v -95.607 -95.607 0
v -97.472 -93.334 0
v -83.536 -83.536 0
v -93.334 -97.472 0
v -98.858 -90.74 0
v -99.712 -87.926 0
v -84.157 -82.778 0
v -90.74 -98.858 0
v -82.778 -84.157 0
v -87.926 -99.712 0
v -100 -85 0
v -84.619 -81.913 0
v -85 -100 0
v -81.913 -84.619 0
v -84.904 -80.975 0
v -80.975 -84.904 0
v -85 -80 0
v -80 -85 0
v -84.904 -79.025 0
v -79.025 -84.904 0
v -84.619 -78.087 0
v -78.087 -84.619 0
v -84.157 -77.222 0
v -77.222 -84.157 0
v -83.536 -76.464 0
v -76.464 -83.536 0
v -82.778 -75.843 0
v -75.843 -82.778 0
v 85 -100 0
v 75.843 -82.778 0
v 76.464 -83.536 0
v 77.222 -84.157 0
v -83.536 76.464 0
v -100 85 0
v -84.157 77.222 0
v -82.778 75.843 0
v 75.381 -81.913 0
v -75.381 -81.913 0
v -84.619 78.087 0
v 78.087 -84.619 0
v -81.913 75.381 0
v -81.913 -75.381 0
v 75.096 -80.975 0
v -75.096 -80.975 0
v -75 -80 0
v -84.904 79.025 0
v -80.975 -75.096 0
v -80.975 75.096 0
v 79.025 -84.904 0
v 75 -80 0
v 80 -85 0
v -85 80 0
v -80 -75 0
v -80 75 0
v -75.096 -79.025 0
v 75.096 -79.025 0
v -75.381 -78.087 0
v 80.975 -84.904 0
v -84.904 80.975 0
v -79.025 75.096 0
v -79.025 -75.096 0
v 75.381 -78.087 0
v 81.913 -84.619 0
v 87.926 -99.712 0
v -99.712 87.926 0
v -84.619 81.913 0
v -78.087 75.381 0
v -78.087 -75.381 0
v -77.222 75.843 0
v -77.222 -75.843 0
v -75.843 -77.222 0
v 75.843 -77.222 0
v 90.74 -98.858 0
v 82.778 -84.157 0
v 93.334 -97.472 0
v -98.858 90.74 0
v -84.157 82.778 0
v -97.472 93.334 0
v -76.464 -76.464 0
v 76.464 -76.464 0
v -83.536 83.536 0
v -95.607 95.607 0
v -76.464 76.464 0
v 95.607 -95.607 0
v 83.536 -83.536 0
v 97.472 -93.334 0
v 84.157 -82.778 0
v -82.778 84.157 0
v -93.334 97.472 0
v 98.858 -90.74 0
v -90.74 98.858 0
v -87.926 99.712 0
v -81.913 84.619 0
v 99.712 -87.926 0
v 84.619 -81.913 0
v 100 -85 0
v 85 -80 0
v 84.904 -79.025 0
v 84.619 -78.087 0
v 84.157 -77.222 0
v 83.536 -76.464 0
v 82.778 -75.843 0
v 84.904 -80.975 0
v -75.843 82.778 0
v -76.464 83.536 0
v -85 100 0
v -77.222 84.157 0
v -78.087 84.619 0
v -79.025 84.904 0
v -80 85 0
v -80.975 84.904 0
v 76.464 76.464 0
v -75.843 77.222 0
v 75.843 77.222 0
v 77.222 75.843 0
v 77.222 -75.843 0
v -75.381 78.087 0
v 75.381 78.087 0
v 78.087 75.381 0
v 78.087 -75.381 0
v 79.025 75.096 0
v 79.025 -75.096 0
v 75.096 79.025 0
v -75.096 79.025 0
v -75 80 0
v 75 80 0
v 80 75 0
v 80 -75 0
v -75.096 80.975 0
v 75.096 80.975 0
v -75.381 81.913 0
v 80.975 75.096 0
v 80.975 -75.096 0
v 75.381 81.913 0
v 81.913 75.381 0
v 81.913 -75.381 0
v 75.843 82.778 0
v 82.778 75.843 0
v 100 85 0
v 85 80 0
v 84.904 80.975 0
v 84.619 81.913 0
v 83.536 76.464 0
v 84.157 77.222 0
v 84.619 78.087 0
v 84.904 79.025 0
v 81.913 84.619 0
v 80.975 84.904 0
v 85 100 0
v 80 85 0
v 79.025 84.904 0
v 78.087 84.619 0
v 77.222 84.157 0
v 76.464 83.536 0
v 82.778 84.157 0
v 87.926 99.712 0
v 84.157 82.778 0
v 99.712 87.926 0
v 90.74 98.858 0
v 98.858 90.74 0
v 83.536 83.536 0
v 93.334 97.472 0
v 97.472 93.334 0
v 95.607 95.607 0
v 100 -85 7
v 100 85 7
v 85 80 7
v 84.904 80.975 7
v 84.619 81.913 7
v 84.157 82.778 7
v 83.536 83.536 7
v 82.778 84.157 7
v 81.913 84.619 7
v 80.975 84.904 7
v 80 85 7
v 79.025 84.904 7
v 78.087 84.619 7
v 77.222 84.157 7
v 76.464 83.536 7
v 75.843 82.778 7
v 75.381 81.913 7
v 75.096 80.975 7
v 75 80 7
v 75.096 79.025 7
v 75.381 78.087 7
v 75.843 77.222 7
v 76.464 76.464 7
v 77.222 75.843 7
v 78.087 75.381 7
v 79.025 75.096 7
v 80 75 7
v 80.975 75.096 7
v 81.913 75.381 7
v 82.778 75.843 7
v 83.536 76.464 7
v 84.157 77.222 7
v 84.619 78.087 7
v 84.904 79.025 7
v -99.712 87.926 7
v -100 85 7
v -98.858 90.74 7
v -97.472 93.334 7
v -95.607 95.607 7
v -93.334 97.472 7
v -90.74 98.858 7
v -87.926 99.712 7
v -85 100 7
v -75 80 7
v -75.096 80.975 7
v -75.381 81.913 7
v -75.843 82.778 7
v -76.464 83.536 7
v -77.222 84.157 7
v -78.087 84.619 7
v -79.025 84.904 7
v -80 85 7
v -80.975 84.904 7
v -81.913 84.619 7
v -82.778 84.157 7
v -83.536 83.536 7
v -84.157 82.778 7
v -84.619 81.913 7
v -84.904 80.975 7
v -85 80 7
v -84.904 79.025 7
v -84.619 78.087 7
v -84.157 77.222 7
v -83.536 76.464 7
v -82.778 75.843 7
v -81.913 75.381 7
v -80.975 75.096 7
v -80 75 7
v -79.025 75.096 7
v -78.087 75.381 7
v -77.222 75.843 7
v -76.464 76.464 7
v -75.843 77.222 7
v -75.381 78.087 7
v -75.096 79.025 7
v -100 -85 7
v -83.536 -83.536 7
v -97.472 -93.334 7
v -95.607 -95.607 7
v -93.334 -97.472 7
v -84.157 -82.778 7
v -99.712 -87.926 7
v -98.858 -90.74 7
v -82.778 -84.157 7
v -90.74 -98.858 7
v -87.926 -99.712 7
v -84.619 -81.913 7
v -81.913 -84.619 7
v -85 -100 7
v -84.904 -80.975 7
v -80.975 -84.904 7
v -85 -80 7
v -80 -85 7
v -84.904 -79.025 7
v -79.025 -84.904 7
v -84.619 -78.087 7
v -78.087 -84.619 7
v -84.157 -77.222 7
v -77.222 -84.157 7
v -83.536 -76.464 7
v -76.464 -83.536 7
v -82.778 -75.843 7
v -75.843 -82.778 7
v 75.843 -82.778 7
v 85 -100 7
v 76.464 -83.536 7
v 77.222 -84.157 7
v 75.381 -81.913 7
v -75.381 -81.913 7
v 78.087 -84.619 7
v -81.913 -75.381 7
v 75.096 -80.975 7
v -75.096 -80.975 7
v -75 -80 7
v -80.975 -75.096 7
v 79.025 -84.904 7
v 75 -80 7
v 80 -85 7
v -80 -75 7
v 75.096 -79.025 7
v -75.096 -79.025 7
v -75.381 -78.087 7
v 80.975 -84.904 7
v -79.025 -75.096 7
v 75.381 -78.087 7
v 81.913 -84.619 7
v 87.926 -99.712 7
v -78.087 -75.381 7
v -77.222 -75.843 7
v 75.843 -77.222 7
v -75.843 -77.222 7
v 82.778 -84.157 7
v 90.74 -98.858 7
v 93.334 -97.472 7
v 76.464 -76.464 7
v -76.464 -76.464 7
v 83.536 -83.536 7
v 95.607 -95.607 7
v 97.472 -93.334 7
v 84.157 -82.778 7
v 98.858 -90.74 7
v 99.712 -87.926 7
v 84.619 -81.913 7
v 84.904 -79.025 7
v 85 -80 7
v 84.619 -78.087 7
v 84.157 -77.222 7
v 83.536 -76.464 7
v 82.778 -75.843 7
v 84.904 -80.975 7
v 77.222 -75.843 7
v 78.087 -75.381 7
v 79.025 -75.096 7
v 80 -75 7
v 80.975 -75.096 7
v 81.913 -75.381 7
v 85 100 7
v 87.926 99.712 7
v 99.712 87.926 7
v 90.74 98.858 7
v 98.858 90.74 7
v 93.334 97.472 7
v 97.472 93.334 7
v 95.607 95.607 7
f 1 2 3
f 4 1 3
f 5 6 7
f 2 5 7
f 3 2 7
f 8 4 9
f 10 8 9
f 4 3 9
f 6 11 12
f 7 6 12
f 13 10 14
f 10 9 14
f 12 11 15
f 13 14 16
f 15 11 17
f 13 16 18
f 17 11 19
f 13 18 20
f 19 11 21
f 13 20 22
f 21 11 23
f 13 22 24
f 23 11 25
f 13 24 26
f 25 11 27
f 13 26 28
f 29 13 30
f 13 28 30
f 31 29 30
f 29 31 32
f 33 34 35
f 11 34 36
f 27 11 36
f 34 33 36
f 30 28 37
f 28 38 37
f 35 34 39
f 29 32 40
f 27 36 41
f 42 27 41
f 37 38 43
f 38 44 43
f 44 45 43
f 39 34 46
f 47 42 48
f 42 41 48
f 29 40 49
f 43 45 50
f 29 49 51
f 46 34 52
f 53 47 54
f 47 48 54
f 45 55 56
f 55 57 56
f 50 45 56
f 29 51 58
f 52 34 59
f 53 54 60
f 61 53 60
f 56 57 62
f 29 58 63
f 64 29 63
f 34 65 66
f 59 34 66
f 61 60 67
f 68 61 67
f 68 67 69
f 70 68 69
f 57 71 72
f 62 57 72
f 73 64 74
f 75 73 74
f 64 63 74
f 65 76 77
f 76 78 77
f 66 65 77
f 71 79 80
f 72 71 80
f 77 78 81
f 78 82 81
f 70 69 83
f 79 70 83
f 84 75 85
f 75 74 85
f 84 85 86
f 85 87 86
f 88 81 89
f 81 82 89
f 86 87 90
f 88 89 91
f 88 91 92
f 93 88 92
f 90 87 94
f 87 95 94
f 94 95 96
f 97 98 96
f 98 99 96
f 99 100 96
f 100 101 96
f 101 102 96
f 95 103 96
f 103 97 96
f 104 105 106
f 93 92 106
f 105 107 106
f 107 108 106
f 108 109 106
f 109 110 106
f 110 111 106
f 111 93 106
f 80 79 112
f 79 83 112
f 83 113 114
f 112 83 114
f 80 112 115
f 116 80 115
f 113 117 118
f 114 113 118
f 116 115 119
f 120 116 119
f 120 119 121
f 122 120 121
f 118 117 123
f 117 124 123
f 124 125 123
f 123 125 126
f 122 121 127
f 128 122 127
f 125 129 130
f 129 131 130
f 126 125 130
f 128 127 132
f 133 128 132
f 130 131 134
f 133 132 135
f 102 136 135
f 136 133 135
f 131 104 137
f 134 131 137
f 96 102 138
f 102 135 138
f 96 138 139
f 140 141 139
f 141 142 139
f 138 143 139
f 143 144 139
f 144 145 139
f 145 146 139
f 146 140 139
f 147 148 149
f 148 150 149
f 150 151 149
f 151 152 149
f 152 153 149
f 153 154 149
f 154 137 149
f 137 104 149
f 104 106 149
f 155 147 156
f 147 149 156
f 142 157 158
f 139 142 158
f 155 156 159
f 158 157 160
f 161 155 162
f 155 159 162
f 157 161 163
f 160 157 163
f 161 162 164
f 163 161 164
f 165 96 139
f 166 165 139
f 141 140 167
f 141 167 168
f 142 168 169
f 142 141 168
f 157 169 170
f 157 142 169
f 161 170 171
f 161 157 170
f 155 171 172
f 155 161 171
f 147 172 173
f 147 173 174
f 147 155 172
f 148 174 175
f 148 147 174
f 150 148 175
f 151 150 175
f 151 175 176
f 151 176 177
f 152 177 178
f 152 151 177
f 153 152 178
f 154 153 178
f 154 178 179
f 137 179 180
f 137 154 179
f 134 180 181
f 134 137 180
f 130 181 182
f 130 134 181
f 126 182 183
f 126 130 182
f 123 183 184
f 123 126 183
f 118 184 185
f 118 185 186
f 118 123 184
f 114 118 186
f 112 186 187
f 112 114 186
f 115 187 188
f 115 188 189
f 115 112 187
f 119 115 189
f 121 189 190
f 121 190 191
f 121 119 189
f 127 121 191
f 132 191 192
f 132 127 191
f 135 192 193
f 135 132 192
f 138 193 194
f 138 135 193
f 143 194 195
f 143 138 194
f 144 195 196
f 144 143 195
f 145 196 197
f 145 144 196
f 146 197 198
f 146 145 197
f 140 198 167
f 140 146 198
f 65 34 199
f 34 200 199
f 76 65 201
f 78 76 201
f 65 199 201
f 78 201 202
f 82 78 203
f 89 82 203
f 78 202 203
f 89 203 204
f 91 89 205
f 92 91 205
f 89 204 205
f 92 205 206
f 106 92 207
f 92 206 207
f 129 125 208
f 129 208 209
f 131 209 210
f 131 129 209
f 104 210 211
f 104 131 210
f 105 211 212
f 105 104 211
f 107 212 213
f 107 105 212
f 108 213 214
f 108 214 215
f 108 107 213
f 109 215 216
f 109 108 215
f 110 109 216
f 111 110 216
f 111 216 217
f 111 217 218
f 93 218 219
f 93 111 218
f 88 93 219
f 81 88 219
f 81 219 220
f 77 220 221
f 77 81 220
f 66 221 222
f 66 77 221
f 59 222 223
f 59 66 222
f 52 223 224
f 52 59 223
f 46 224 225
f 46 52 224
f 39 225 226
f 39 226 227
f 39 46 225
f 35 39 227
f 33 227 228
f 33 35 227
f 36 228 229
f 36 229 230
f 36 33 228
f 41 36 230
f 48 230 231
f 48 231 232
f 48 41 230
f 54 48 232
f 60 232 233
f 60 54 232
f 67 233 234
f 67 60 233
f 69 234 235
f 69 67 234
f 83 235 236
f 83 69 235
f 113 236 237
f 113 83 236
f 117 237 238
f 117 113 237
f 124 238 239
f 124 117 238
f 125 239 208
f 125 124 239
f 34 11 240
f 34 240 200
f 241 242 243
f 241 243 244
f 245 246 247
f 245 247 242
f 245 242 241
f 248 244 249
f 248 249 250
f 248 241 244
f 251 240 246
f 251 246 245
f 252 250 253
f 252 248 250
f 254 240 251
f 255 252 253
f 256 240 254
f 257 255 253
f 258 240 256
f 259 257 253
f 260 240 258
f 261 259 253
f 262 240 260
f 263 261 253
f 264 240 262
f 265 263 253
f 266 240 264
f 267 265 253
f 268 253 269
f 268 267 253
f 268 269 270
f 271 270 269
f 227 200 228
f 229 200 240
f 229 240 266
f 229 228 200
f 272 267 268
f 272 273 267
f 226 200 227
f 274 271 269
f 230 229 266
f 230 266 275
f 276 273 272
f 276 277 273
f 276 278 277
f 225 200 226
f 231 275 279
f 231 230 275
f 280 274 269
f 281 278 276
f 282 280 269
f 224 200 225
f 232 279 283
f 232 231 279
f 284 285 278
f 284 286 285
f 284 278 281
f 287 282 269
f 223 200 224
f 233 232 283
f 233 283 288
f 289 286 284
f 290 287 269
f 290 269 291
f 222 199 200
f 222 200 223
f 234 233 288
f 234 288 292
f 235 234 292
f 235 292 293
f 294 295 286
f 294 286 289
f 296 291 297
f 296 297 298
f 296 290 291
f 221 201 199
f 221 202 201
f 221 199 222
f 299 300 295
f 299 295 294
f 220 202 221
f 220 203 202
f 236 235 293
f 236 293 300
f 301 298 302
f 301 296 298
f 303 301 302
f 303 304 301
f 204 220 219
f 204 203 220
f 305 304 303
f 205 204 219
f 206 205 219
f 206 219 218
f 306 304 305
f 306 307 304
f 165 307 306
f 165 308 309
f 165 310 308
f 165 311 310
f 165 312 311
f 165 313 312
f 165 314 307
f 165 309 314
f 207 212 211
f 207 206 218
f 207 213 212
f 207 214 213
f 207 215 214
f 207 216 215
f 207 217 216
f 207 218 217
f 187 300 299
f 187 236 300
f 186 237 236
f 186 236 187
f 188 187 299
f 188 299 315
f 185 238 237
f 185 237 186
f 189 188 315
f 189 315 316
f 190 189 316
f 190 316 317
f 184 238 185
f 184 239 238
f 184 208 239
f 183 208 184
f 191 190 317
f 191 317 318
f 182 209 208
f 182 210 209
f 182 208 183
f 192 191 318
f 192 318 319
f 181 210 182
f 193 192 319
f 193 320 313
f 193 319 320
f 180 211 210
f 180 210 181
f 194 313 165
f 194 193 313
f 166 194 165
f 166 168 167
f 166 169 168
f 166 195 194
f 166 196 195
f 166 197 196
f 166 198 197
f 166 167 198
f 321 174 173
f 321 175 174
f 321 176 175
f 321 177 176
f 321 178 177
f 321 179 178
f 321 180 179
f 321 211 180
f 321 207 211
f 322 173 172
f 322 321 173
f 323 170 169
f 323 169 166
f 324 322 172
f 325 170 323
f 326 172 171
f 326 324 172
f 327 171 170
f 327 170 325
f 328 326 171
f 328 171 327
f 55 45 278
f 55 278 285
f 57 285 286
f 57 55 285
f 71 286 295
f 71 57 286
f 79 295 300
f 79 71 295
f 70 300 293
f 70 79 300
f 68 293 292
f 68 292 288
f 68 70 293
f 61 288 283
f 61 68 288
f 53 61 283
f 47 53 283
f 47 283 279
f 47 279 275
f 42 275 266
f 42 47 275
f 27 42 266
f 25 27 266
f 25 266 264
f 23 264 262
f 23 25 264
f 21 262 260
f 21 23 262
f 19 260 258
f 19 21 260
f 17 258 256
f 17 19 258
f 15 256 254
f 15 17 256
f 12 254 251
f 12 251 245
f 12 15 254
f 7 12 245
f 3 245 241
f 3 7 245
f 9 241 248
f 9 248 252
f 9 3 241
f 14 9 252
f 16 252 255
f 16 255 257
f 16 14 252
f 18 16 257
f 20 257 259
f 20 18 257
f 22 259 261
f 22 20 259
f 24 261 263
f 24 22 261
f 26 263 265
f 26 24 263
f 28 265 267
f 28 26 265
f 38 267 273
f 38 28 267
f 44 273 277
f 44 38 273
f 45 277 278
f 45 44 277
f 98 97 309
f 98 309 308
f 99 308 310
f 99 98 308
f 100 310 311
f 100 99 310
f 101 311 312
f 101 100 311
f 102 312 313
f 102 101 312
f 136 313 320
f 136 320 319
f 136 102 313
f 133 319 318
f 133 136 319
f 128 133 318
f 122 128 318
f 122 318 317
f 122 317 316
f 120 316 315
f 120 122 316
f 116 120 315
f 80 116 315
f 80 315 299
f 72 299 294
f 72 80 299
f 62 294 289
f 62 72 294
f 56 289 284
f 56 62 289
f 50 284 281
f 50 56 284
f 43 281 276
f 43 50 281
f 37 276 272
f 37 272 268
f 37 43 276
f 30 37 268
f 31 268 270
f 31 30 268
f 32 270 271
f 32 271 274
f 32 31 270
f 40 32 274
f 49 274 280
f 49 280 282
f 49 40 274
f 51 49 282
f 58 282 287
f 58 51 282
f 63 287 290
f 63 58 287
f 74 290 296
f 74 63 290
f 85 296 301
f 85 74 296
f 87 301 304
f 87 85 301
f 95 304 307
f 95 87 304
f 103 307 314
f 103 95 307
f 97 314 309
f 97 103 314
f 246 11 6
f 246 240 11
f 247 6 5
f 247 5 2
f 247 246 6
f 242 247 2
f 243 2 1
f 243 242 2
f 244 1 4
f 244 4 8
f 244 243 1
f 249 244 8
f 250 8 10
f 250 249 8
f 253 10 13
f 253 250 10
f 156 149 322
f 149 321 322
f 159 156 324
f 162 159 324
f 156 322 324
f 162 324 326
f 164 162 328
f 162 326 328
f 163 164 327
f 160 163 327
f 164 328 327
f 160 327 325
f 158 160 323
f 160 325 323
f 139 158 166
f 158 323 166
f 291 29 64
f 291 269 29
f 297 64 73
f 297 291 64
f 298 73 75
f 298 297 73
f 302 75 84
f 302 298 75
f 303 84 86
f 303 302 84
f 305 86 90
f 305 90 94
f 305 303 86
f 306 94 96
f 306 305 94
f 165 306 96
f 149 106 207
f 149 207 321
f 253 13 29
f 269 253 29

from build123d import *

# Parameters (mm, degrees)
ESQUISSE3_W        = 200
ESQUISSE3_H        = 200
ESQUISSE3_R        = 5
BOSS_EXTRU_2_DEPTH = 7
CONG_1_R           = 15


with BuildPart() as part:
    # Esquisse3 → Boss.-Extru.2 (new body)
    with BuildSketch(Plane.XY):
        Rectangle(ESQUISSE3_W, ESQUISSE3_H)
        with Locations((80, 80)):
            Circle(ESQUISSE3_R, mode=Mode.SUBTRACT)
        with Locations((80, -80)):
            Circle(ESQUISSE3_R, mode=Mode.SUBTRACT)
        with Locations((-80, -80)):
            Circle(ESQUISSE3_R, mode=Mode.SUBTRACT)
        with Locations((-80, 80)):
            Circle(ESQUISSE3_R, mode=Mode.SUBTRACT)
    extrude(amount=BOSS_EXTRU_2_DEPTH)

    # Congé1
    cong_1_edges = [part.edges().sort_by_distance(p)[0] for p in [
        (-100, 100, 3.5),
        (100, 100, 3.5),
        (100, -100, 3.5),
        (-100, -100, 3.5),
    ]]
    fillet(cong_1_edges, radius=CONG_1_R)


solid = part.part
